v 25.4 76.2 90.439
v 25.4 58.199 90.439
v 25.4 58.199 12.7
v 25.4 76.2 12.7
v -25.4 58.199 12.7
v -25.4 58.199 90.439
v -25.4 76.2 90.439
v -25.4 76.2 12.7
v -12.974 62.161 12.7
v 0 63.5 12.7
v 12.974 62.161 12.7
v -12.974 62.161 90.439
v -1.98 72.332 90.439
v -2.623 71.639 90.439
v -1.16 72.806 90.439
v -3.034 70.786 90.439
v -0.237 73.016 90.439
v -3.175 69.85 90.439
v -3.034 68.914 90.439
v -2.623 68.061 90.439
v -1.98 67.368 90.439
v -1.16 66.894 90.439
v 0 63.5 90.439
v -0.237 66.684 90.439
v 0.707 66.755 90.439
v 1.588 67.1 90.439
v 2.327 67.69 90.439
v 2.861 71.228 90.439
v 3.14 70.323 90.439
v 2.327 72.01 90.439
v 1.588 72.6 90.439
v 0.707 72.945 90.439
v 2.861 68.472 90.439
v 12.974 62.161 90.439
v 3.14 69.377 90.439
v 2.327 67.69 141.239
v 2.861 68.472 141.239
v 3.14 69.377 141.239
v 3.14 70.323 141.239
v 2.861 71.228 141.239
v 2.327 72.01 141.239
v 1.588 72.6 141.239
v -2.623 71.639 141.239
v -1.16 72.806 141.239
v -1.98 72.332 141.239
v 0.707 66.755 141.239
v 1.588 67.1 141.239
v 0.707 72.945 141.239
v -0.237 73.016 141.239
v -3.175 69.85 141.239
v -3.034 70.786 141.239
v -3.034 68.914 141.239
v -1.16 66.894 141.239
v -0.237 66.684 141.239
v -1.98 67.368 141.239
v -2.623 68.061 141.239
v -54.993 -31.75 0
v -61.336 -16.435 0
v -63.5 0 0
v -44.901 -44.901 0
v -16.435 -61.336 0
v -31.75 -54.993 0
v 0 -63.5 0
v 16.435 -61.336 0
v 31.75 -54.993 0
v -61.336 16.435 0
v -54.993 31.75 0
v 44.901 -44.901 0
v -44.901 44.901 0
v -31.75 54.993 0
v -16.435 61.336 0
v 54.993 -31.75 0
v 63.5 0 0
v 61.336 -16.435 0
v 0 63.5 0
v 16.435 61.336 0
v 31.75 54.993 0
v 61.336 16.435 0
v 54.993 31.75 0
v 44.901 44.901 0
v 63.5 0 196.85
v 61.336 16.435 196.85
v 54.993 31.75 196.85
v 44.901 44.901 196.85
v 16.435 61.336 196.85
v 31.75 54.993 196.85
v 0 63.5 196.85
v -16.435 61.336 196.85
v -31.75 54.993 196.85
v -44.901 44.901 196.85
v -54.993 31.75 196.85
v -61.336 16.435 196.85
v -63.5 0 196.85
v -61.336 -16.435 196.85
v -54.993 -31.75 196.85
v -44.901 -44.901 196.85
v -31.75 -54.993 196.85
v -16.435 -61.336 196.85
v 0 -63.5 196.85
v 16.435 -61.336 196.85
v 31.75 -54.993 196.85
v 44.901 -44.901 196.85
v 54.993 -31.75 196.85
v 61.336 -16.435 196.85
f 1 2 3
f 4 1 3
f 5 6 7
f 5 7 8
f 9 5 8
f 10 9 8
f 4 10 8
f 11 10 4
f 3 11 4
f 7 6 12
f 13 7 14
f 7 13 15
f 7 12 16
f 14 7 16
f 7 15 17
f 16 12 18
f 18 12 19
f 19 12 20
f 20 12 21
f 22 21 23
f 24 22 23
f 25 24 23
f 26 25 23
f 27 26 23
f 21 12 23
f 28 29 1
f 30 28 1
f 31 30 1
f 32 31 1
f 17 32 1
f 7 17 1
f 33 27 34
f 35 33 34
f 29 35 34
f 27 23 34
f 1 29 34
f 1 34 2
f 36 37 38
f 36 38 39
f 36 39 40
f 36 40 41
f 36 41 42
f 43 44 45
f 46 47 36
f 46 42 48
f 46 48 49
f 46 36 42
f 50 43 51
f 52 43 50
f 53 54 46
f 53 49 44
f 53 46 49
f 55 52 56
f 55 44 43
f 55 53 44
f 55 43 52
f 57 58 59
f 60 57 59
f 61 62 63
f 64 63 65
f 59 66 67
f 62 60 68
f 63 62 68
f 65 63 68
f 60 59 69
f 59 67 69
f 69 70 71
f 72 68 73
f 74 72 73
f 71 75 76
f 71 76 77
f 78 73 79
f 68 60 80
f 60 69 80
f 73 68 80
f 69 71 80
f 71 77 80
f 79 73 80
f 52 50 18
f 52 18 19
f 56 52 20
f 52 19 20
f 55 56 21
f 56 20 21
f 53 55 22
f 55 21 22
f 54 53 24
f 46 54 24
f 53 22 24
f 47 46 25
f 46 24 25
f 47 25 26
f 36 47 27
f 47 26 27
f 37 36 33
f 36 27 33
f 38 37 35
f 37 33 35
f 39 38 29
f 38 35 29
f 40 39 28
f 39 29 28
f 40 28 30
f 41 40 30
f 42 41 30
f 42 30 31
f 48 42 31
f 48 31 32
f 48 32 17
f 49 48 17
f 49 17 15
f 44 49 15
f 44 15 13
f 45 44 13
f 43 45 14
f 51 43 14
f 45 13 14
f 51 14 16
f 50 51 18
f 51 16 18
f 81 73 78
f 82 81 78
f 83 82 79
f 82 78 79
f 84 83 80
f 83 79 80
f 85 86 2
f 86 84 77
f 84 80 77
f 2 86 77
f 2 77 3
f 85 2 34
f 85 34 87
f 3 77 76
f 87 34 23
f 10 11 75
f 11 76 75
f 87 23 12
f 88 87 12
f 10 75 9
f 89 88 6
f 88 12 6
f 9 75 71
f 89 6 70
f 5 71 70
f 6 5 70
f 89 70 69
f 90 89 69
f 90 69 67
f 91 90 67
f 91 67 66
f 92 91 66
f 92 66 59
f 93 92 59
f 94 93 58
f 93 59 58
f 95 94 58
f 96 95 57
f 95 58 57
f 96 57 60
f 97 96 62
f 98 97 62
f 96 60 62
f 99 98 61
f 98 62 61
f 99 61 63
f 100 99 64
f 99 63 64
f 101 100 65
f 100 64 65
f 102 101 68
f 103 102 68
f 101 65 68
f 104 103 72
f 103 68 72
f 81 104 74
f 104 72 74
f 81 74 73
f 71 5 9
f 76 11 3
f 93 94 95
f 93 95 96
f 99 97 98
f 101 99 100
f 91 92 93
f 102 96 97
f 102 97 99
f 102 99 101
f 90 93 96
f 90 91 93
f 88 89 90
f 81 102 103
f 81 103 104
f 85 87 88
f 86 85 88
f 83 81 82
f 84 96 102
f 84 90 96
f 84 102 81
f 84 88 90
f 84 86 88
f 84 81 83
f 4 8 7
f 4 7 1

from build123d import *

# Parameters (mm, degrees)
SKETCH7_R           = 63.5
BOSS_EXTRUDE4_DEPTH = 196.85
SKETCH9_W           = 50.8
SKETCH9_H           = 77.739224187
BOSS_EXTRUDE5_DEPTH = 25.4
SKETCH10_R          = 3.175
BOSS_EXTRUDE6_DEPTH = 50.8


with BuildPart() as part:
    # Sketch7 → Boss-Extrude4 (new body)
    with BuildSketch(Plane.XY):
        Circle(SKETCH7_R)
    extrude(amount=BOSS_EXTRUDE4_DEPTH)

    # Sketch9 → Boss-Extrude5 (add)
    with BuildSketch(Plane(origin=(0, 50.8, 0), x_dir=(1, 0, 0), z_dir=(0, 1, 0))):
        with Locations((0, -51.569612094)):
            Rectangle(SKETCH9_W, SKETCH9_H)
    extrude(amount=BOSS_EXTRUDE5_DEPTH)

    # Sketch10 → Boss-Extrude6 (add)
    with BuildSketch(Plane.XY.offset(90.439224187)):
        with Locations(Location((0, 69.85, 0), (0, 0, 180))):
            Circle(SKETCH10_R)
    extrude(amount=BOSS_EXTRUDE6_DEPTH)


solid = part.part
